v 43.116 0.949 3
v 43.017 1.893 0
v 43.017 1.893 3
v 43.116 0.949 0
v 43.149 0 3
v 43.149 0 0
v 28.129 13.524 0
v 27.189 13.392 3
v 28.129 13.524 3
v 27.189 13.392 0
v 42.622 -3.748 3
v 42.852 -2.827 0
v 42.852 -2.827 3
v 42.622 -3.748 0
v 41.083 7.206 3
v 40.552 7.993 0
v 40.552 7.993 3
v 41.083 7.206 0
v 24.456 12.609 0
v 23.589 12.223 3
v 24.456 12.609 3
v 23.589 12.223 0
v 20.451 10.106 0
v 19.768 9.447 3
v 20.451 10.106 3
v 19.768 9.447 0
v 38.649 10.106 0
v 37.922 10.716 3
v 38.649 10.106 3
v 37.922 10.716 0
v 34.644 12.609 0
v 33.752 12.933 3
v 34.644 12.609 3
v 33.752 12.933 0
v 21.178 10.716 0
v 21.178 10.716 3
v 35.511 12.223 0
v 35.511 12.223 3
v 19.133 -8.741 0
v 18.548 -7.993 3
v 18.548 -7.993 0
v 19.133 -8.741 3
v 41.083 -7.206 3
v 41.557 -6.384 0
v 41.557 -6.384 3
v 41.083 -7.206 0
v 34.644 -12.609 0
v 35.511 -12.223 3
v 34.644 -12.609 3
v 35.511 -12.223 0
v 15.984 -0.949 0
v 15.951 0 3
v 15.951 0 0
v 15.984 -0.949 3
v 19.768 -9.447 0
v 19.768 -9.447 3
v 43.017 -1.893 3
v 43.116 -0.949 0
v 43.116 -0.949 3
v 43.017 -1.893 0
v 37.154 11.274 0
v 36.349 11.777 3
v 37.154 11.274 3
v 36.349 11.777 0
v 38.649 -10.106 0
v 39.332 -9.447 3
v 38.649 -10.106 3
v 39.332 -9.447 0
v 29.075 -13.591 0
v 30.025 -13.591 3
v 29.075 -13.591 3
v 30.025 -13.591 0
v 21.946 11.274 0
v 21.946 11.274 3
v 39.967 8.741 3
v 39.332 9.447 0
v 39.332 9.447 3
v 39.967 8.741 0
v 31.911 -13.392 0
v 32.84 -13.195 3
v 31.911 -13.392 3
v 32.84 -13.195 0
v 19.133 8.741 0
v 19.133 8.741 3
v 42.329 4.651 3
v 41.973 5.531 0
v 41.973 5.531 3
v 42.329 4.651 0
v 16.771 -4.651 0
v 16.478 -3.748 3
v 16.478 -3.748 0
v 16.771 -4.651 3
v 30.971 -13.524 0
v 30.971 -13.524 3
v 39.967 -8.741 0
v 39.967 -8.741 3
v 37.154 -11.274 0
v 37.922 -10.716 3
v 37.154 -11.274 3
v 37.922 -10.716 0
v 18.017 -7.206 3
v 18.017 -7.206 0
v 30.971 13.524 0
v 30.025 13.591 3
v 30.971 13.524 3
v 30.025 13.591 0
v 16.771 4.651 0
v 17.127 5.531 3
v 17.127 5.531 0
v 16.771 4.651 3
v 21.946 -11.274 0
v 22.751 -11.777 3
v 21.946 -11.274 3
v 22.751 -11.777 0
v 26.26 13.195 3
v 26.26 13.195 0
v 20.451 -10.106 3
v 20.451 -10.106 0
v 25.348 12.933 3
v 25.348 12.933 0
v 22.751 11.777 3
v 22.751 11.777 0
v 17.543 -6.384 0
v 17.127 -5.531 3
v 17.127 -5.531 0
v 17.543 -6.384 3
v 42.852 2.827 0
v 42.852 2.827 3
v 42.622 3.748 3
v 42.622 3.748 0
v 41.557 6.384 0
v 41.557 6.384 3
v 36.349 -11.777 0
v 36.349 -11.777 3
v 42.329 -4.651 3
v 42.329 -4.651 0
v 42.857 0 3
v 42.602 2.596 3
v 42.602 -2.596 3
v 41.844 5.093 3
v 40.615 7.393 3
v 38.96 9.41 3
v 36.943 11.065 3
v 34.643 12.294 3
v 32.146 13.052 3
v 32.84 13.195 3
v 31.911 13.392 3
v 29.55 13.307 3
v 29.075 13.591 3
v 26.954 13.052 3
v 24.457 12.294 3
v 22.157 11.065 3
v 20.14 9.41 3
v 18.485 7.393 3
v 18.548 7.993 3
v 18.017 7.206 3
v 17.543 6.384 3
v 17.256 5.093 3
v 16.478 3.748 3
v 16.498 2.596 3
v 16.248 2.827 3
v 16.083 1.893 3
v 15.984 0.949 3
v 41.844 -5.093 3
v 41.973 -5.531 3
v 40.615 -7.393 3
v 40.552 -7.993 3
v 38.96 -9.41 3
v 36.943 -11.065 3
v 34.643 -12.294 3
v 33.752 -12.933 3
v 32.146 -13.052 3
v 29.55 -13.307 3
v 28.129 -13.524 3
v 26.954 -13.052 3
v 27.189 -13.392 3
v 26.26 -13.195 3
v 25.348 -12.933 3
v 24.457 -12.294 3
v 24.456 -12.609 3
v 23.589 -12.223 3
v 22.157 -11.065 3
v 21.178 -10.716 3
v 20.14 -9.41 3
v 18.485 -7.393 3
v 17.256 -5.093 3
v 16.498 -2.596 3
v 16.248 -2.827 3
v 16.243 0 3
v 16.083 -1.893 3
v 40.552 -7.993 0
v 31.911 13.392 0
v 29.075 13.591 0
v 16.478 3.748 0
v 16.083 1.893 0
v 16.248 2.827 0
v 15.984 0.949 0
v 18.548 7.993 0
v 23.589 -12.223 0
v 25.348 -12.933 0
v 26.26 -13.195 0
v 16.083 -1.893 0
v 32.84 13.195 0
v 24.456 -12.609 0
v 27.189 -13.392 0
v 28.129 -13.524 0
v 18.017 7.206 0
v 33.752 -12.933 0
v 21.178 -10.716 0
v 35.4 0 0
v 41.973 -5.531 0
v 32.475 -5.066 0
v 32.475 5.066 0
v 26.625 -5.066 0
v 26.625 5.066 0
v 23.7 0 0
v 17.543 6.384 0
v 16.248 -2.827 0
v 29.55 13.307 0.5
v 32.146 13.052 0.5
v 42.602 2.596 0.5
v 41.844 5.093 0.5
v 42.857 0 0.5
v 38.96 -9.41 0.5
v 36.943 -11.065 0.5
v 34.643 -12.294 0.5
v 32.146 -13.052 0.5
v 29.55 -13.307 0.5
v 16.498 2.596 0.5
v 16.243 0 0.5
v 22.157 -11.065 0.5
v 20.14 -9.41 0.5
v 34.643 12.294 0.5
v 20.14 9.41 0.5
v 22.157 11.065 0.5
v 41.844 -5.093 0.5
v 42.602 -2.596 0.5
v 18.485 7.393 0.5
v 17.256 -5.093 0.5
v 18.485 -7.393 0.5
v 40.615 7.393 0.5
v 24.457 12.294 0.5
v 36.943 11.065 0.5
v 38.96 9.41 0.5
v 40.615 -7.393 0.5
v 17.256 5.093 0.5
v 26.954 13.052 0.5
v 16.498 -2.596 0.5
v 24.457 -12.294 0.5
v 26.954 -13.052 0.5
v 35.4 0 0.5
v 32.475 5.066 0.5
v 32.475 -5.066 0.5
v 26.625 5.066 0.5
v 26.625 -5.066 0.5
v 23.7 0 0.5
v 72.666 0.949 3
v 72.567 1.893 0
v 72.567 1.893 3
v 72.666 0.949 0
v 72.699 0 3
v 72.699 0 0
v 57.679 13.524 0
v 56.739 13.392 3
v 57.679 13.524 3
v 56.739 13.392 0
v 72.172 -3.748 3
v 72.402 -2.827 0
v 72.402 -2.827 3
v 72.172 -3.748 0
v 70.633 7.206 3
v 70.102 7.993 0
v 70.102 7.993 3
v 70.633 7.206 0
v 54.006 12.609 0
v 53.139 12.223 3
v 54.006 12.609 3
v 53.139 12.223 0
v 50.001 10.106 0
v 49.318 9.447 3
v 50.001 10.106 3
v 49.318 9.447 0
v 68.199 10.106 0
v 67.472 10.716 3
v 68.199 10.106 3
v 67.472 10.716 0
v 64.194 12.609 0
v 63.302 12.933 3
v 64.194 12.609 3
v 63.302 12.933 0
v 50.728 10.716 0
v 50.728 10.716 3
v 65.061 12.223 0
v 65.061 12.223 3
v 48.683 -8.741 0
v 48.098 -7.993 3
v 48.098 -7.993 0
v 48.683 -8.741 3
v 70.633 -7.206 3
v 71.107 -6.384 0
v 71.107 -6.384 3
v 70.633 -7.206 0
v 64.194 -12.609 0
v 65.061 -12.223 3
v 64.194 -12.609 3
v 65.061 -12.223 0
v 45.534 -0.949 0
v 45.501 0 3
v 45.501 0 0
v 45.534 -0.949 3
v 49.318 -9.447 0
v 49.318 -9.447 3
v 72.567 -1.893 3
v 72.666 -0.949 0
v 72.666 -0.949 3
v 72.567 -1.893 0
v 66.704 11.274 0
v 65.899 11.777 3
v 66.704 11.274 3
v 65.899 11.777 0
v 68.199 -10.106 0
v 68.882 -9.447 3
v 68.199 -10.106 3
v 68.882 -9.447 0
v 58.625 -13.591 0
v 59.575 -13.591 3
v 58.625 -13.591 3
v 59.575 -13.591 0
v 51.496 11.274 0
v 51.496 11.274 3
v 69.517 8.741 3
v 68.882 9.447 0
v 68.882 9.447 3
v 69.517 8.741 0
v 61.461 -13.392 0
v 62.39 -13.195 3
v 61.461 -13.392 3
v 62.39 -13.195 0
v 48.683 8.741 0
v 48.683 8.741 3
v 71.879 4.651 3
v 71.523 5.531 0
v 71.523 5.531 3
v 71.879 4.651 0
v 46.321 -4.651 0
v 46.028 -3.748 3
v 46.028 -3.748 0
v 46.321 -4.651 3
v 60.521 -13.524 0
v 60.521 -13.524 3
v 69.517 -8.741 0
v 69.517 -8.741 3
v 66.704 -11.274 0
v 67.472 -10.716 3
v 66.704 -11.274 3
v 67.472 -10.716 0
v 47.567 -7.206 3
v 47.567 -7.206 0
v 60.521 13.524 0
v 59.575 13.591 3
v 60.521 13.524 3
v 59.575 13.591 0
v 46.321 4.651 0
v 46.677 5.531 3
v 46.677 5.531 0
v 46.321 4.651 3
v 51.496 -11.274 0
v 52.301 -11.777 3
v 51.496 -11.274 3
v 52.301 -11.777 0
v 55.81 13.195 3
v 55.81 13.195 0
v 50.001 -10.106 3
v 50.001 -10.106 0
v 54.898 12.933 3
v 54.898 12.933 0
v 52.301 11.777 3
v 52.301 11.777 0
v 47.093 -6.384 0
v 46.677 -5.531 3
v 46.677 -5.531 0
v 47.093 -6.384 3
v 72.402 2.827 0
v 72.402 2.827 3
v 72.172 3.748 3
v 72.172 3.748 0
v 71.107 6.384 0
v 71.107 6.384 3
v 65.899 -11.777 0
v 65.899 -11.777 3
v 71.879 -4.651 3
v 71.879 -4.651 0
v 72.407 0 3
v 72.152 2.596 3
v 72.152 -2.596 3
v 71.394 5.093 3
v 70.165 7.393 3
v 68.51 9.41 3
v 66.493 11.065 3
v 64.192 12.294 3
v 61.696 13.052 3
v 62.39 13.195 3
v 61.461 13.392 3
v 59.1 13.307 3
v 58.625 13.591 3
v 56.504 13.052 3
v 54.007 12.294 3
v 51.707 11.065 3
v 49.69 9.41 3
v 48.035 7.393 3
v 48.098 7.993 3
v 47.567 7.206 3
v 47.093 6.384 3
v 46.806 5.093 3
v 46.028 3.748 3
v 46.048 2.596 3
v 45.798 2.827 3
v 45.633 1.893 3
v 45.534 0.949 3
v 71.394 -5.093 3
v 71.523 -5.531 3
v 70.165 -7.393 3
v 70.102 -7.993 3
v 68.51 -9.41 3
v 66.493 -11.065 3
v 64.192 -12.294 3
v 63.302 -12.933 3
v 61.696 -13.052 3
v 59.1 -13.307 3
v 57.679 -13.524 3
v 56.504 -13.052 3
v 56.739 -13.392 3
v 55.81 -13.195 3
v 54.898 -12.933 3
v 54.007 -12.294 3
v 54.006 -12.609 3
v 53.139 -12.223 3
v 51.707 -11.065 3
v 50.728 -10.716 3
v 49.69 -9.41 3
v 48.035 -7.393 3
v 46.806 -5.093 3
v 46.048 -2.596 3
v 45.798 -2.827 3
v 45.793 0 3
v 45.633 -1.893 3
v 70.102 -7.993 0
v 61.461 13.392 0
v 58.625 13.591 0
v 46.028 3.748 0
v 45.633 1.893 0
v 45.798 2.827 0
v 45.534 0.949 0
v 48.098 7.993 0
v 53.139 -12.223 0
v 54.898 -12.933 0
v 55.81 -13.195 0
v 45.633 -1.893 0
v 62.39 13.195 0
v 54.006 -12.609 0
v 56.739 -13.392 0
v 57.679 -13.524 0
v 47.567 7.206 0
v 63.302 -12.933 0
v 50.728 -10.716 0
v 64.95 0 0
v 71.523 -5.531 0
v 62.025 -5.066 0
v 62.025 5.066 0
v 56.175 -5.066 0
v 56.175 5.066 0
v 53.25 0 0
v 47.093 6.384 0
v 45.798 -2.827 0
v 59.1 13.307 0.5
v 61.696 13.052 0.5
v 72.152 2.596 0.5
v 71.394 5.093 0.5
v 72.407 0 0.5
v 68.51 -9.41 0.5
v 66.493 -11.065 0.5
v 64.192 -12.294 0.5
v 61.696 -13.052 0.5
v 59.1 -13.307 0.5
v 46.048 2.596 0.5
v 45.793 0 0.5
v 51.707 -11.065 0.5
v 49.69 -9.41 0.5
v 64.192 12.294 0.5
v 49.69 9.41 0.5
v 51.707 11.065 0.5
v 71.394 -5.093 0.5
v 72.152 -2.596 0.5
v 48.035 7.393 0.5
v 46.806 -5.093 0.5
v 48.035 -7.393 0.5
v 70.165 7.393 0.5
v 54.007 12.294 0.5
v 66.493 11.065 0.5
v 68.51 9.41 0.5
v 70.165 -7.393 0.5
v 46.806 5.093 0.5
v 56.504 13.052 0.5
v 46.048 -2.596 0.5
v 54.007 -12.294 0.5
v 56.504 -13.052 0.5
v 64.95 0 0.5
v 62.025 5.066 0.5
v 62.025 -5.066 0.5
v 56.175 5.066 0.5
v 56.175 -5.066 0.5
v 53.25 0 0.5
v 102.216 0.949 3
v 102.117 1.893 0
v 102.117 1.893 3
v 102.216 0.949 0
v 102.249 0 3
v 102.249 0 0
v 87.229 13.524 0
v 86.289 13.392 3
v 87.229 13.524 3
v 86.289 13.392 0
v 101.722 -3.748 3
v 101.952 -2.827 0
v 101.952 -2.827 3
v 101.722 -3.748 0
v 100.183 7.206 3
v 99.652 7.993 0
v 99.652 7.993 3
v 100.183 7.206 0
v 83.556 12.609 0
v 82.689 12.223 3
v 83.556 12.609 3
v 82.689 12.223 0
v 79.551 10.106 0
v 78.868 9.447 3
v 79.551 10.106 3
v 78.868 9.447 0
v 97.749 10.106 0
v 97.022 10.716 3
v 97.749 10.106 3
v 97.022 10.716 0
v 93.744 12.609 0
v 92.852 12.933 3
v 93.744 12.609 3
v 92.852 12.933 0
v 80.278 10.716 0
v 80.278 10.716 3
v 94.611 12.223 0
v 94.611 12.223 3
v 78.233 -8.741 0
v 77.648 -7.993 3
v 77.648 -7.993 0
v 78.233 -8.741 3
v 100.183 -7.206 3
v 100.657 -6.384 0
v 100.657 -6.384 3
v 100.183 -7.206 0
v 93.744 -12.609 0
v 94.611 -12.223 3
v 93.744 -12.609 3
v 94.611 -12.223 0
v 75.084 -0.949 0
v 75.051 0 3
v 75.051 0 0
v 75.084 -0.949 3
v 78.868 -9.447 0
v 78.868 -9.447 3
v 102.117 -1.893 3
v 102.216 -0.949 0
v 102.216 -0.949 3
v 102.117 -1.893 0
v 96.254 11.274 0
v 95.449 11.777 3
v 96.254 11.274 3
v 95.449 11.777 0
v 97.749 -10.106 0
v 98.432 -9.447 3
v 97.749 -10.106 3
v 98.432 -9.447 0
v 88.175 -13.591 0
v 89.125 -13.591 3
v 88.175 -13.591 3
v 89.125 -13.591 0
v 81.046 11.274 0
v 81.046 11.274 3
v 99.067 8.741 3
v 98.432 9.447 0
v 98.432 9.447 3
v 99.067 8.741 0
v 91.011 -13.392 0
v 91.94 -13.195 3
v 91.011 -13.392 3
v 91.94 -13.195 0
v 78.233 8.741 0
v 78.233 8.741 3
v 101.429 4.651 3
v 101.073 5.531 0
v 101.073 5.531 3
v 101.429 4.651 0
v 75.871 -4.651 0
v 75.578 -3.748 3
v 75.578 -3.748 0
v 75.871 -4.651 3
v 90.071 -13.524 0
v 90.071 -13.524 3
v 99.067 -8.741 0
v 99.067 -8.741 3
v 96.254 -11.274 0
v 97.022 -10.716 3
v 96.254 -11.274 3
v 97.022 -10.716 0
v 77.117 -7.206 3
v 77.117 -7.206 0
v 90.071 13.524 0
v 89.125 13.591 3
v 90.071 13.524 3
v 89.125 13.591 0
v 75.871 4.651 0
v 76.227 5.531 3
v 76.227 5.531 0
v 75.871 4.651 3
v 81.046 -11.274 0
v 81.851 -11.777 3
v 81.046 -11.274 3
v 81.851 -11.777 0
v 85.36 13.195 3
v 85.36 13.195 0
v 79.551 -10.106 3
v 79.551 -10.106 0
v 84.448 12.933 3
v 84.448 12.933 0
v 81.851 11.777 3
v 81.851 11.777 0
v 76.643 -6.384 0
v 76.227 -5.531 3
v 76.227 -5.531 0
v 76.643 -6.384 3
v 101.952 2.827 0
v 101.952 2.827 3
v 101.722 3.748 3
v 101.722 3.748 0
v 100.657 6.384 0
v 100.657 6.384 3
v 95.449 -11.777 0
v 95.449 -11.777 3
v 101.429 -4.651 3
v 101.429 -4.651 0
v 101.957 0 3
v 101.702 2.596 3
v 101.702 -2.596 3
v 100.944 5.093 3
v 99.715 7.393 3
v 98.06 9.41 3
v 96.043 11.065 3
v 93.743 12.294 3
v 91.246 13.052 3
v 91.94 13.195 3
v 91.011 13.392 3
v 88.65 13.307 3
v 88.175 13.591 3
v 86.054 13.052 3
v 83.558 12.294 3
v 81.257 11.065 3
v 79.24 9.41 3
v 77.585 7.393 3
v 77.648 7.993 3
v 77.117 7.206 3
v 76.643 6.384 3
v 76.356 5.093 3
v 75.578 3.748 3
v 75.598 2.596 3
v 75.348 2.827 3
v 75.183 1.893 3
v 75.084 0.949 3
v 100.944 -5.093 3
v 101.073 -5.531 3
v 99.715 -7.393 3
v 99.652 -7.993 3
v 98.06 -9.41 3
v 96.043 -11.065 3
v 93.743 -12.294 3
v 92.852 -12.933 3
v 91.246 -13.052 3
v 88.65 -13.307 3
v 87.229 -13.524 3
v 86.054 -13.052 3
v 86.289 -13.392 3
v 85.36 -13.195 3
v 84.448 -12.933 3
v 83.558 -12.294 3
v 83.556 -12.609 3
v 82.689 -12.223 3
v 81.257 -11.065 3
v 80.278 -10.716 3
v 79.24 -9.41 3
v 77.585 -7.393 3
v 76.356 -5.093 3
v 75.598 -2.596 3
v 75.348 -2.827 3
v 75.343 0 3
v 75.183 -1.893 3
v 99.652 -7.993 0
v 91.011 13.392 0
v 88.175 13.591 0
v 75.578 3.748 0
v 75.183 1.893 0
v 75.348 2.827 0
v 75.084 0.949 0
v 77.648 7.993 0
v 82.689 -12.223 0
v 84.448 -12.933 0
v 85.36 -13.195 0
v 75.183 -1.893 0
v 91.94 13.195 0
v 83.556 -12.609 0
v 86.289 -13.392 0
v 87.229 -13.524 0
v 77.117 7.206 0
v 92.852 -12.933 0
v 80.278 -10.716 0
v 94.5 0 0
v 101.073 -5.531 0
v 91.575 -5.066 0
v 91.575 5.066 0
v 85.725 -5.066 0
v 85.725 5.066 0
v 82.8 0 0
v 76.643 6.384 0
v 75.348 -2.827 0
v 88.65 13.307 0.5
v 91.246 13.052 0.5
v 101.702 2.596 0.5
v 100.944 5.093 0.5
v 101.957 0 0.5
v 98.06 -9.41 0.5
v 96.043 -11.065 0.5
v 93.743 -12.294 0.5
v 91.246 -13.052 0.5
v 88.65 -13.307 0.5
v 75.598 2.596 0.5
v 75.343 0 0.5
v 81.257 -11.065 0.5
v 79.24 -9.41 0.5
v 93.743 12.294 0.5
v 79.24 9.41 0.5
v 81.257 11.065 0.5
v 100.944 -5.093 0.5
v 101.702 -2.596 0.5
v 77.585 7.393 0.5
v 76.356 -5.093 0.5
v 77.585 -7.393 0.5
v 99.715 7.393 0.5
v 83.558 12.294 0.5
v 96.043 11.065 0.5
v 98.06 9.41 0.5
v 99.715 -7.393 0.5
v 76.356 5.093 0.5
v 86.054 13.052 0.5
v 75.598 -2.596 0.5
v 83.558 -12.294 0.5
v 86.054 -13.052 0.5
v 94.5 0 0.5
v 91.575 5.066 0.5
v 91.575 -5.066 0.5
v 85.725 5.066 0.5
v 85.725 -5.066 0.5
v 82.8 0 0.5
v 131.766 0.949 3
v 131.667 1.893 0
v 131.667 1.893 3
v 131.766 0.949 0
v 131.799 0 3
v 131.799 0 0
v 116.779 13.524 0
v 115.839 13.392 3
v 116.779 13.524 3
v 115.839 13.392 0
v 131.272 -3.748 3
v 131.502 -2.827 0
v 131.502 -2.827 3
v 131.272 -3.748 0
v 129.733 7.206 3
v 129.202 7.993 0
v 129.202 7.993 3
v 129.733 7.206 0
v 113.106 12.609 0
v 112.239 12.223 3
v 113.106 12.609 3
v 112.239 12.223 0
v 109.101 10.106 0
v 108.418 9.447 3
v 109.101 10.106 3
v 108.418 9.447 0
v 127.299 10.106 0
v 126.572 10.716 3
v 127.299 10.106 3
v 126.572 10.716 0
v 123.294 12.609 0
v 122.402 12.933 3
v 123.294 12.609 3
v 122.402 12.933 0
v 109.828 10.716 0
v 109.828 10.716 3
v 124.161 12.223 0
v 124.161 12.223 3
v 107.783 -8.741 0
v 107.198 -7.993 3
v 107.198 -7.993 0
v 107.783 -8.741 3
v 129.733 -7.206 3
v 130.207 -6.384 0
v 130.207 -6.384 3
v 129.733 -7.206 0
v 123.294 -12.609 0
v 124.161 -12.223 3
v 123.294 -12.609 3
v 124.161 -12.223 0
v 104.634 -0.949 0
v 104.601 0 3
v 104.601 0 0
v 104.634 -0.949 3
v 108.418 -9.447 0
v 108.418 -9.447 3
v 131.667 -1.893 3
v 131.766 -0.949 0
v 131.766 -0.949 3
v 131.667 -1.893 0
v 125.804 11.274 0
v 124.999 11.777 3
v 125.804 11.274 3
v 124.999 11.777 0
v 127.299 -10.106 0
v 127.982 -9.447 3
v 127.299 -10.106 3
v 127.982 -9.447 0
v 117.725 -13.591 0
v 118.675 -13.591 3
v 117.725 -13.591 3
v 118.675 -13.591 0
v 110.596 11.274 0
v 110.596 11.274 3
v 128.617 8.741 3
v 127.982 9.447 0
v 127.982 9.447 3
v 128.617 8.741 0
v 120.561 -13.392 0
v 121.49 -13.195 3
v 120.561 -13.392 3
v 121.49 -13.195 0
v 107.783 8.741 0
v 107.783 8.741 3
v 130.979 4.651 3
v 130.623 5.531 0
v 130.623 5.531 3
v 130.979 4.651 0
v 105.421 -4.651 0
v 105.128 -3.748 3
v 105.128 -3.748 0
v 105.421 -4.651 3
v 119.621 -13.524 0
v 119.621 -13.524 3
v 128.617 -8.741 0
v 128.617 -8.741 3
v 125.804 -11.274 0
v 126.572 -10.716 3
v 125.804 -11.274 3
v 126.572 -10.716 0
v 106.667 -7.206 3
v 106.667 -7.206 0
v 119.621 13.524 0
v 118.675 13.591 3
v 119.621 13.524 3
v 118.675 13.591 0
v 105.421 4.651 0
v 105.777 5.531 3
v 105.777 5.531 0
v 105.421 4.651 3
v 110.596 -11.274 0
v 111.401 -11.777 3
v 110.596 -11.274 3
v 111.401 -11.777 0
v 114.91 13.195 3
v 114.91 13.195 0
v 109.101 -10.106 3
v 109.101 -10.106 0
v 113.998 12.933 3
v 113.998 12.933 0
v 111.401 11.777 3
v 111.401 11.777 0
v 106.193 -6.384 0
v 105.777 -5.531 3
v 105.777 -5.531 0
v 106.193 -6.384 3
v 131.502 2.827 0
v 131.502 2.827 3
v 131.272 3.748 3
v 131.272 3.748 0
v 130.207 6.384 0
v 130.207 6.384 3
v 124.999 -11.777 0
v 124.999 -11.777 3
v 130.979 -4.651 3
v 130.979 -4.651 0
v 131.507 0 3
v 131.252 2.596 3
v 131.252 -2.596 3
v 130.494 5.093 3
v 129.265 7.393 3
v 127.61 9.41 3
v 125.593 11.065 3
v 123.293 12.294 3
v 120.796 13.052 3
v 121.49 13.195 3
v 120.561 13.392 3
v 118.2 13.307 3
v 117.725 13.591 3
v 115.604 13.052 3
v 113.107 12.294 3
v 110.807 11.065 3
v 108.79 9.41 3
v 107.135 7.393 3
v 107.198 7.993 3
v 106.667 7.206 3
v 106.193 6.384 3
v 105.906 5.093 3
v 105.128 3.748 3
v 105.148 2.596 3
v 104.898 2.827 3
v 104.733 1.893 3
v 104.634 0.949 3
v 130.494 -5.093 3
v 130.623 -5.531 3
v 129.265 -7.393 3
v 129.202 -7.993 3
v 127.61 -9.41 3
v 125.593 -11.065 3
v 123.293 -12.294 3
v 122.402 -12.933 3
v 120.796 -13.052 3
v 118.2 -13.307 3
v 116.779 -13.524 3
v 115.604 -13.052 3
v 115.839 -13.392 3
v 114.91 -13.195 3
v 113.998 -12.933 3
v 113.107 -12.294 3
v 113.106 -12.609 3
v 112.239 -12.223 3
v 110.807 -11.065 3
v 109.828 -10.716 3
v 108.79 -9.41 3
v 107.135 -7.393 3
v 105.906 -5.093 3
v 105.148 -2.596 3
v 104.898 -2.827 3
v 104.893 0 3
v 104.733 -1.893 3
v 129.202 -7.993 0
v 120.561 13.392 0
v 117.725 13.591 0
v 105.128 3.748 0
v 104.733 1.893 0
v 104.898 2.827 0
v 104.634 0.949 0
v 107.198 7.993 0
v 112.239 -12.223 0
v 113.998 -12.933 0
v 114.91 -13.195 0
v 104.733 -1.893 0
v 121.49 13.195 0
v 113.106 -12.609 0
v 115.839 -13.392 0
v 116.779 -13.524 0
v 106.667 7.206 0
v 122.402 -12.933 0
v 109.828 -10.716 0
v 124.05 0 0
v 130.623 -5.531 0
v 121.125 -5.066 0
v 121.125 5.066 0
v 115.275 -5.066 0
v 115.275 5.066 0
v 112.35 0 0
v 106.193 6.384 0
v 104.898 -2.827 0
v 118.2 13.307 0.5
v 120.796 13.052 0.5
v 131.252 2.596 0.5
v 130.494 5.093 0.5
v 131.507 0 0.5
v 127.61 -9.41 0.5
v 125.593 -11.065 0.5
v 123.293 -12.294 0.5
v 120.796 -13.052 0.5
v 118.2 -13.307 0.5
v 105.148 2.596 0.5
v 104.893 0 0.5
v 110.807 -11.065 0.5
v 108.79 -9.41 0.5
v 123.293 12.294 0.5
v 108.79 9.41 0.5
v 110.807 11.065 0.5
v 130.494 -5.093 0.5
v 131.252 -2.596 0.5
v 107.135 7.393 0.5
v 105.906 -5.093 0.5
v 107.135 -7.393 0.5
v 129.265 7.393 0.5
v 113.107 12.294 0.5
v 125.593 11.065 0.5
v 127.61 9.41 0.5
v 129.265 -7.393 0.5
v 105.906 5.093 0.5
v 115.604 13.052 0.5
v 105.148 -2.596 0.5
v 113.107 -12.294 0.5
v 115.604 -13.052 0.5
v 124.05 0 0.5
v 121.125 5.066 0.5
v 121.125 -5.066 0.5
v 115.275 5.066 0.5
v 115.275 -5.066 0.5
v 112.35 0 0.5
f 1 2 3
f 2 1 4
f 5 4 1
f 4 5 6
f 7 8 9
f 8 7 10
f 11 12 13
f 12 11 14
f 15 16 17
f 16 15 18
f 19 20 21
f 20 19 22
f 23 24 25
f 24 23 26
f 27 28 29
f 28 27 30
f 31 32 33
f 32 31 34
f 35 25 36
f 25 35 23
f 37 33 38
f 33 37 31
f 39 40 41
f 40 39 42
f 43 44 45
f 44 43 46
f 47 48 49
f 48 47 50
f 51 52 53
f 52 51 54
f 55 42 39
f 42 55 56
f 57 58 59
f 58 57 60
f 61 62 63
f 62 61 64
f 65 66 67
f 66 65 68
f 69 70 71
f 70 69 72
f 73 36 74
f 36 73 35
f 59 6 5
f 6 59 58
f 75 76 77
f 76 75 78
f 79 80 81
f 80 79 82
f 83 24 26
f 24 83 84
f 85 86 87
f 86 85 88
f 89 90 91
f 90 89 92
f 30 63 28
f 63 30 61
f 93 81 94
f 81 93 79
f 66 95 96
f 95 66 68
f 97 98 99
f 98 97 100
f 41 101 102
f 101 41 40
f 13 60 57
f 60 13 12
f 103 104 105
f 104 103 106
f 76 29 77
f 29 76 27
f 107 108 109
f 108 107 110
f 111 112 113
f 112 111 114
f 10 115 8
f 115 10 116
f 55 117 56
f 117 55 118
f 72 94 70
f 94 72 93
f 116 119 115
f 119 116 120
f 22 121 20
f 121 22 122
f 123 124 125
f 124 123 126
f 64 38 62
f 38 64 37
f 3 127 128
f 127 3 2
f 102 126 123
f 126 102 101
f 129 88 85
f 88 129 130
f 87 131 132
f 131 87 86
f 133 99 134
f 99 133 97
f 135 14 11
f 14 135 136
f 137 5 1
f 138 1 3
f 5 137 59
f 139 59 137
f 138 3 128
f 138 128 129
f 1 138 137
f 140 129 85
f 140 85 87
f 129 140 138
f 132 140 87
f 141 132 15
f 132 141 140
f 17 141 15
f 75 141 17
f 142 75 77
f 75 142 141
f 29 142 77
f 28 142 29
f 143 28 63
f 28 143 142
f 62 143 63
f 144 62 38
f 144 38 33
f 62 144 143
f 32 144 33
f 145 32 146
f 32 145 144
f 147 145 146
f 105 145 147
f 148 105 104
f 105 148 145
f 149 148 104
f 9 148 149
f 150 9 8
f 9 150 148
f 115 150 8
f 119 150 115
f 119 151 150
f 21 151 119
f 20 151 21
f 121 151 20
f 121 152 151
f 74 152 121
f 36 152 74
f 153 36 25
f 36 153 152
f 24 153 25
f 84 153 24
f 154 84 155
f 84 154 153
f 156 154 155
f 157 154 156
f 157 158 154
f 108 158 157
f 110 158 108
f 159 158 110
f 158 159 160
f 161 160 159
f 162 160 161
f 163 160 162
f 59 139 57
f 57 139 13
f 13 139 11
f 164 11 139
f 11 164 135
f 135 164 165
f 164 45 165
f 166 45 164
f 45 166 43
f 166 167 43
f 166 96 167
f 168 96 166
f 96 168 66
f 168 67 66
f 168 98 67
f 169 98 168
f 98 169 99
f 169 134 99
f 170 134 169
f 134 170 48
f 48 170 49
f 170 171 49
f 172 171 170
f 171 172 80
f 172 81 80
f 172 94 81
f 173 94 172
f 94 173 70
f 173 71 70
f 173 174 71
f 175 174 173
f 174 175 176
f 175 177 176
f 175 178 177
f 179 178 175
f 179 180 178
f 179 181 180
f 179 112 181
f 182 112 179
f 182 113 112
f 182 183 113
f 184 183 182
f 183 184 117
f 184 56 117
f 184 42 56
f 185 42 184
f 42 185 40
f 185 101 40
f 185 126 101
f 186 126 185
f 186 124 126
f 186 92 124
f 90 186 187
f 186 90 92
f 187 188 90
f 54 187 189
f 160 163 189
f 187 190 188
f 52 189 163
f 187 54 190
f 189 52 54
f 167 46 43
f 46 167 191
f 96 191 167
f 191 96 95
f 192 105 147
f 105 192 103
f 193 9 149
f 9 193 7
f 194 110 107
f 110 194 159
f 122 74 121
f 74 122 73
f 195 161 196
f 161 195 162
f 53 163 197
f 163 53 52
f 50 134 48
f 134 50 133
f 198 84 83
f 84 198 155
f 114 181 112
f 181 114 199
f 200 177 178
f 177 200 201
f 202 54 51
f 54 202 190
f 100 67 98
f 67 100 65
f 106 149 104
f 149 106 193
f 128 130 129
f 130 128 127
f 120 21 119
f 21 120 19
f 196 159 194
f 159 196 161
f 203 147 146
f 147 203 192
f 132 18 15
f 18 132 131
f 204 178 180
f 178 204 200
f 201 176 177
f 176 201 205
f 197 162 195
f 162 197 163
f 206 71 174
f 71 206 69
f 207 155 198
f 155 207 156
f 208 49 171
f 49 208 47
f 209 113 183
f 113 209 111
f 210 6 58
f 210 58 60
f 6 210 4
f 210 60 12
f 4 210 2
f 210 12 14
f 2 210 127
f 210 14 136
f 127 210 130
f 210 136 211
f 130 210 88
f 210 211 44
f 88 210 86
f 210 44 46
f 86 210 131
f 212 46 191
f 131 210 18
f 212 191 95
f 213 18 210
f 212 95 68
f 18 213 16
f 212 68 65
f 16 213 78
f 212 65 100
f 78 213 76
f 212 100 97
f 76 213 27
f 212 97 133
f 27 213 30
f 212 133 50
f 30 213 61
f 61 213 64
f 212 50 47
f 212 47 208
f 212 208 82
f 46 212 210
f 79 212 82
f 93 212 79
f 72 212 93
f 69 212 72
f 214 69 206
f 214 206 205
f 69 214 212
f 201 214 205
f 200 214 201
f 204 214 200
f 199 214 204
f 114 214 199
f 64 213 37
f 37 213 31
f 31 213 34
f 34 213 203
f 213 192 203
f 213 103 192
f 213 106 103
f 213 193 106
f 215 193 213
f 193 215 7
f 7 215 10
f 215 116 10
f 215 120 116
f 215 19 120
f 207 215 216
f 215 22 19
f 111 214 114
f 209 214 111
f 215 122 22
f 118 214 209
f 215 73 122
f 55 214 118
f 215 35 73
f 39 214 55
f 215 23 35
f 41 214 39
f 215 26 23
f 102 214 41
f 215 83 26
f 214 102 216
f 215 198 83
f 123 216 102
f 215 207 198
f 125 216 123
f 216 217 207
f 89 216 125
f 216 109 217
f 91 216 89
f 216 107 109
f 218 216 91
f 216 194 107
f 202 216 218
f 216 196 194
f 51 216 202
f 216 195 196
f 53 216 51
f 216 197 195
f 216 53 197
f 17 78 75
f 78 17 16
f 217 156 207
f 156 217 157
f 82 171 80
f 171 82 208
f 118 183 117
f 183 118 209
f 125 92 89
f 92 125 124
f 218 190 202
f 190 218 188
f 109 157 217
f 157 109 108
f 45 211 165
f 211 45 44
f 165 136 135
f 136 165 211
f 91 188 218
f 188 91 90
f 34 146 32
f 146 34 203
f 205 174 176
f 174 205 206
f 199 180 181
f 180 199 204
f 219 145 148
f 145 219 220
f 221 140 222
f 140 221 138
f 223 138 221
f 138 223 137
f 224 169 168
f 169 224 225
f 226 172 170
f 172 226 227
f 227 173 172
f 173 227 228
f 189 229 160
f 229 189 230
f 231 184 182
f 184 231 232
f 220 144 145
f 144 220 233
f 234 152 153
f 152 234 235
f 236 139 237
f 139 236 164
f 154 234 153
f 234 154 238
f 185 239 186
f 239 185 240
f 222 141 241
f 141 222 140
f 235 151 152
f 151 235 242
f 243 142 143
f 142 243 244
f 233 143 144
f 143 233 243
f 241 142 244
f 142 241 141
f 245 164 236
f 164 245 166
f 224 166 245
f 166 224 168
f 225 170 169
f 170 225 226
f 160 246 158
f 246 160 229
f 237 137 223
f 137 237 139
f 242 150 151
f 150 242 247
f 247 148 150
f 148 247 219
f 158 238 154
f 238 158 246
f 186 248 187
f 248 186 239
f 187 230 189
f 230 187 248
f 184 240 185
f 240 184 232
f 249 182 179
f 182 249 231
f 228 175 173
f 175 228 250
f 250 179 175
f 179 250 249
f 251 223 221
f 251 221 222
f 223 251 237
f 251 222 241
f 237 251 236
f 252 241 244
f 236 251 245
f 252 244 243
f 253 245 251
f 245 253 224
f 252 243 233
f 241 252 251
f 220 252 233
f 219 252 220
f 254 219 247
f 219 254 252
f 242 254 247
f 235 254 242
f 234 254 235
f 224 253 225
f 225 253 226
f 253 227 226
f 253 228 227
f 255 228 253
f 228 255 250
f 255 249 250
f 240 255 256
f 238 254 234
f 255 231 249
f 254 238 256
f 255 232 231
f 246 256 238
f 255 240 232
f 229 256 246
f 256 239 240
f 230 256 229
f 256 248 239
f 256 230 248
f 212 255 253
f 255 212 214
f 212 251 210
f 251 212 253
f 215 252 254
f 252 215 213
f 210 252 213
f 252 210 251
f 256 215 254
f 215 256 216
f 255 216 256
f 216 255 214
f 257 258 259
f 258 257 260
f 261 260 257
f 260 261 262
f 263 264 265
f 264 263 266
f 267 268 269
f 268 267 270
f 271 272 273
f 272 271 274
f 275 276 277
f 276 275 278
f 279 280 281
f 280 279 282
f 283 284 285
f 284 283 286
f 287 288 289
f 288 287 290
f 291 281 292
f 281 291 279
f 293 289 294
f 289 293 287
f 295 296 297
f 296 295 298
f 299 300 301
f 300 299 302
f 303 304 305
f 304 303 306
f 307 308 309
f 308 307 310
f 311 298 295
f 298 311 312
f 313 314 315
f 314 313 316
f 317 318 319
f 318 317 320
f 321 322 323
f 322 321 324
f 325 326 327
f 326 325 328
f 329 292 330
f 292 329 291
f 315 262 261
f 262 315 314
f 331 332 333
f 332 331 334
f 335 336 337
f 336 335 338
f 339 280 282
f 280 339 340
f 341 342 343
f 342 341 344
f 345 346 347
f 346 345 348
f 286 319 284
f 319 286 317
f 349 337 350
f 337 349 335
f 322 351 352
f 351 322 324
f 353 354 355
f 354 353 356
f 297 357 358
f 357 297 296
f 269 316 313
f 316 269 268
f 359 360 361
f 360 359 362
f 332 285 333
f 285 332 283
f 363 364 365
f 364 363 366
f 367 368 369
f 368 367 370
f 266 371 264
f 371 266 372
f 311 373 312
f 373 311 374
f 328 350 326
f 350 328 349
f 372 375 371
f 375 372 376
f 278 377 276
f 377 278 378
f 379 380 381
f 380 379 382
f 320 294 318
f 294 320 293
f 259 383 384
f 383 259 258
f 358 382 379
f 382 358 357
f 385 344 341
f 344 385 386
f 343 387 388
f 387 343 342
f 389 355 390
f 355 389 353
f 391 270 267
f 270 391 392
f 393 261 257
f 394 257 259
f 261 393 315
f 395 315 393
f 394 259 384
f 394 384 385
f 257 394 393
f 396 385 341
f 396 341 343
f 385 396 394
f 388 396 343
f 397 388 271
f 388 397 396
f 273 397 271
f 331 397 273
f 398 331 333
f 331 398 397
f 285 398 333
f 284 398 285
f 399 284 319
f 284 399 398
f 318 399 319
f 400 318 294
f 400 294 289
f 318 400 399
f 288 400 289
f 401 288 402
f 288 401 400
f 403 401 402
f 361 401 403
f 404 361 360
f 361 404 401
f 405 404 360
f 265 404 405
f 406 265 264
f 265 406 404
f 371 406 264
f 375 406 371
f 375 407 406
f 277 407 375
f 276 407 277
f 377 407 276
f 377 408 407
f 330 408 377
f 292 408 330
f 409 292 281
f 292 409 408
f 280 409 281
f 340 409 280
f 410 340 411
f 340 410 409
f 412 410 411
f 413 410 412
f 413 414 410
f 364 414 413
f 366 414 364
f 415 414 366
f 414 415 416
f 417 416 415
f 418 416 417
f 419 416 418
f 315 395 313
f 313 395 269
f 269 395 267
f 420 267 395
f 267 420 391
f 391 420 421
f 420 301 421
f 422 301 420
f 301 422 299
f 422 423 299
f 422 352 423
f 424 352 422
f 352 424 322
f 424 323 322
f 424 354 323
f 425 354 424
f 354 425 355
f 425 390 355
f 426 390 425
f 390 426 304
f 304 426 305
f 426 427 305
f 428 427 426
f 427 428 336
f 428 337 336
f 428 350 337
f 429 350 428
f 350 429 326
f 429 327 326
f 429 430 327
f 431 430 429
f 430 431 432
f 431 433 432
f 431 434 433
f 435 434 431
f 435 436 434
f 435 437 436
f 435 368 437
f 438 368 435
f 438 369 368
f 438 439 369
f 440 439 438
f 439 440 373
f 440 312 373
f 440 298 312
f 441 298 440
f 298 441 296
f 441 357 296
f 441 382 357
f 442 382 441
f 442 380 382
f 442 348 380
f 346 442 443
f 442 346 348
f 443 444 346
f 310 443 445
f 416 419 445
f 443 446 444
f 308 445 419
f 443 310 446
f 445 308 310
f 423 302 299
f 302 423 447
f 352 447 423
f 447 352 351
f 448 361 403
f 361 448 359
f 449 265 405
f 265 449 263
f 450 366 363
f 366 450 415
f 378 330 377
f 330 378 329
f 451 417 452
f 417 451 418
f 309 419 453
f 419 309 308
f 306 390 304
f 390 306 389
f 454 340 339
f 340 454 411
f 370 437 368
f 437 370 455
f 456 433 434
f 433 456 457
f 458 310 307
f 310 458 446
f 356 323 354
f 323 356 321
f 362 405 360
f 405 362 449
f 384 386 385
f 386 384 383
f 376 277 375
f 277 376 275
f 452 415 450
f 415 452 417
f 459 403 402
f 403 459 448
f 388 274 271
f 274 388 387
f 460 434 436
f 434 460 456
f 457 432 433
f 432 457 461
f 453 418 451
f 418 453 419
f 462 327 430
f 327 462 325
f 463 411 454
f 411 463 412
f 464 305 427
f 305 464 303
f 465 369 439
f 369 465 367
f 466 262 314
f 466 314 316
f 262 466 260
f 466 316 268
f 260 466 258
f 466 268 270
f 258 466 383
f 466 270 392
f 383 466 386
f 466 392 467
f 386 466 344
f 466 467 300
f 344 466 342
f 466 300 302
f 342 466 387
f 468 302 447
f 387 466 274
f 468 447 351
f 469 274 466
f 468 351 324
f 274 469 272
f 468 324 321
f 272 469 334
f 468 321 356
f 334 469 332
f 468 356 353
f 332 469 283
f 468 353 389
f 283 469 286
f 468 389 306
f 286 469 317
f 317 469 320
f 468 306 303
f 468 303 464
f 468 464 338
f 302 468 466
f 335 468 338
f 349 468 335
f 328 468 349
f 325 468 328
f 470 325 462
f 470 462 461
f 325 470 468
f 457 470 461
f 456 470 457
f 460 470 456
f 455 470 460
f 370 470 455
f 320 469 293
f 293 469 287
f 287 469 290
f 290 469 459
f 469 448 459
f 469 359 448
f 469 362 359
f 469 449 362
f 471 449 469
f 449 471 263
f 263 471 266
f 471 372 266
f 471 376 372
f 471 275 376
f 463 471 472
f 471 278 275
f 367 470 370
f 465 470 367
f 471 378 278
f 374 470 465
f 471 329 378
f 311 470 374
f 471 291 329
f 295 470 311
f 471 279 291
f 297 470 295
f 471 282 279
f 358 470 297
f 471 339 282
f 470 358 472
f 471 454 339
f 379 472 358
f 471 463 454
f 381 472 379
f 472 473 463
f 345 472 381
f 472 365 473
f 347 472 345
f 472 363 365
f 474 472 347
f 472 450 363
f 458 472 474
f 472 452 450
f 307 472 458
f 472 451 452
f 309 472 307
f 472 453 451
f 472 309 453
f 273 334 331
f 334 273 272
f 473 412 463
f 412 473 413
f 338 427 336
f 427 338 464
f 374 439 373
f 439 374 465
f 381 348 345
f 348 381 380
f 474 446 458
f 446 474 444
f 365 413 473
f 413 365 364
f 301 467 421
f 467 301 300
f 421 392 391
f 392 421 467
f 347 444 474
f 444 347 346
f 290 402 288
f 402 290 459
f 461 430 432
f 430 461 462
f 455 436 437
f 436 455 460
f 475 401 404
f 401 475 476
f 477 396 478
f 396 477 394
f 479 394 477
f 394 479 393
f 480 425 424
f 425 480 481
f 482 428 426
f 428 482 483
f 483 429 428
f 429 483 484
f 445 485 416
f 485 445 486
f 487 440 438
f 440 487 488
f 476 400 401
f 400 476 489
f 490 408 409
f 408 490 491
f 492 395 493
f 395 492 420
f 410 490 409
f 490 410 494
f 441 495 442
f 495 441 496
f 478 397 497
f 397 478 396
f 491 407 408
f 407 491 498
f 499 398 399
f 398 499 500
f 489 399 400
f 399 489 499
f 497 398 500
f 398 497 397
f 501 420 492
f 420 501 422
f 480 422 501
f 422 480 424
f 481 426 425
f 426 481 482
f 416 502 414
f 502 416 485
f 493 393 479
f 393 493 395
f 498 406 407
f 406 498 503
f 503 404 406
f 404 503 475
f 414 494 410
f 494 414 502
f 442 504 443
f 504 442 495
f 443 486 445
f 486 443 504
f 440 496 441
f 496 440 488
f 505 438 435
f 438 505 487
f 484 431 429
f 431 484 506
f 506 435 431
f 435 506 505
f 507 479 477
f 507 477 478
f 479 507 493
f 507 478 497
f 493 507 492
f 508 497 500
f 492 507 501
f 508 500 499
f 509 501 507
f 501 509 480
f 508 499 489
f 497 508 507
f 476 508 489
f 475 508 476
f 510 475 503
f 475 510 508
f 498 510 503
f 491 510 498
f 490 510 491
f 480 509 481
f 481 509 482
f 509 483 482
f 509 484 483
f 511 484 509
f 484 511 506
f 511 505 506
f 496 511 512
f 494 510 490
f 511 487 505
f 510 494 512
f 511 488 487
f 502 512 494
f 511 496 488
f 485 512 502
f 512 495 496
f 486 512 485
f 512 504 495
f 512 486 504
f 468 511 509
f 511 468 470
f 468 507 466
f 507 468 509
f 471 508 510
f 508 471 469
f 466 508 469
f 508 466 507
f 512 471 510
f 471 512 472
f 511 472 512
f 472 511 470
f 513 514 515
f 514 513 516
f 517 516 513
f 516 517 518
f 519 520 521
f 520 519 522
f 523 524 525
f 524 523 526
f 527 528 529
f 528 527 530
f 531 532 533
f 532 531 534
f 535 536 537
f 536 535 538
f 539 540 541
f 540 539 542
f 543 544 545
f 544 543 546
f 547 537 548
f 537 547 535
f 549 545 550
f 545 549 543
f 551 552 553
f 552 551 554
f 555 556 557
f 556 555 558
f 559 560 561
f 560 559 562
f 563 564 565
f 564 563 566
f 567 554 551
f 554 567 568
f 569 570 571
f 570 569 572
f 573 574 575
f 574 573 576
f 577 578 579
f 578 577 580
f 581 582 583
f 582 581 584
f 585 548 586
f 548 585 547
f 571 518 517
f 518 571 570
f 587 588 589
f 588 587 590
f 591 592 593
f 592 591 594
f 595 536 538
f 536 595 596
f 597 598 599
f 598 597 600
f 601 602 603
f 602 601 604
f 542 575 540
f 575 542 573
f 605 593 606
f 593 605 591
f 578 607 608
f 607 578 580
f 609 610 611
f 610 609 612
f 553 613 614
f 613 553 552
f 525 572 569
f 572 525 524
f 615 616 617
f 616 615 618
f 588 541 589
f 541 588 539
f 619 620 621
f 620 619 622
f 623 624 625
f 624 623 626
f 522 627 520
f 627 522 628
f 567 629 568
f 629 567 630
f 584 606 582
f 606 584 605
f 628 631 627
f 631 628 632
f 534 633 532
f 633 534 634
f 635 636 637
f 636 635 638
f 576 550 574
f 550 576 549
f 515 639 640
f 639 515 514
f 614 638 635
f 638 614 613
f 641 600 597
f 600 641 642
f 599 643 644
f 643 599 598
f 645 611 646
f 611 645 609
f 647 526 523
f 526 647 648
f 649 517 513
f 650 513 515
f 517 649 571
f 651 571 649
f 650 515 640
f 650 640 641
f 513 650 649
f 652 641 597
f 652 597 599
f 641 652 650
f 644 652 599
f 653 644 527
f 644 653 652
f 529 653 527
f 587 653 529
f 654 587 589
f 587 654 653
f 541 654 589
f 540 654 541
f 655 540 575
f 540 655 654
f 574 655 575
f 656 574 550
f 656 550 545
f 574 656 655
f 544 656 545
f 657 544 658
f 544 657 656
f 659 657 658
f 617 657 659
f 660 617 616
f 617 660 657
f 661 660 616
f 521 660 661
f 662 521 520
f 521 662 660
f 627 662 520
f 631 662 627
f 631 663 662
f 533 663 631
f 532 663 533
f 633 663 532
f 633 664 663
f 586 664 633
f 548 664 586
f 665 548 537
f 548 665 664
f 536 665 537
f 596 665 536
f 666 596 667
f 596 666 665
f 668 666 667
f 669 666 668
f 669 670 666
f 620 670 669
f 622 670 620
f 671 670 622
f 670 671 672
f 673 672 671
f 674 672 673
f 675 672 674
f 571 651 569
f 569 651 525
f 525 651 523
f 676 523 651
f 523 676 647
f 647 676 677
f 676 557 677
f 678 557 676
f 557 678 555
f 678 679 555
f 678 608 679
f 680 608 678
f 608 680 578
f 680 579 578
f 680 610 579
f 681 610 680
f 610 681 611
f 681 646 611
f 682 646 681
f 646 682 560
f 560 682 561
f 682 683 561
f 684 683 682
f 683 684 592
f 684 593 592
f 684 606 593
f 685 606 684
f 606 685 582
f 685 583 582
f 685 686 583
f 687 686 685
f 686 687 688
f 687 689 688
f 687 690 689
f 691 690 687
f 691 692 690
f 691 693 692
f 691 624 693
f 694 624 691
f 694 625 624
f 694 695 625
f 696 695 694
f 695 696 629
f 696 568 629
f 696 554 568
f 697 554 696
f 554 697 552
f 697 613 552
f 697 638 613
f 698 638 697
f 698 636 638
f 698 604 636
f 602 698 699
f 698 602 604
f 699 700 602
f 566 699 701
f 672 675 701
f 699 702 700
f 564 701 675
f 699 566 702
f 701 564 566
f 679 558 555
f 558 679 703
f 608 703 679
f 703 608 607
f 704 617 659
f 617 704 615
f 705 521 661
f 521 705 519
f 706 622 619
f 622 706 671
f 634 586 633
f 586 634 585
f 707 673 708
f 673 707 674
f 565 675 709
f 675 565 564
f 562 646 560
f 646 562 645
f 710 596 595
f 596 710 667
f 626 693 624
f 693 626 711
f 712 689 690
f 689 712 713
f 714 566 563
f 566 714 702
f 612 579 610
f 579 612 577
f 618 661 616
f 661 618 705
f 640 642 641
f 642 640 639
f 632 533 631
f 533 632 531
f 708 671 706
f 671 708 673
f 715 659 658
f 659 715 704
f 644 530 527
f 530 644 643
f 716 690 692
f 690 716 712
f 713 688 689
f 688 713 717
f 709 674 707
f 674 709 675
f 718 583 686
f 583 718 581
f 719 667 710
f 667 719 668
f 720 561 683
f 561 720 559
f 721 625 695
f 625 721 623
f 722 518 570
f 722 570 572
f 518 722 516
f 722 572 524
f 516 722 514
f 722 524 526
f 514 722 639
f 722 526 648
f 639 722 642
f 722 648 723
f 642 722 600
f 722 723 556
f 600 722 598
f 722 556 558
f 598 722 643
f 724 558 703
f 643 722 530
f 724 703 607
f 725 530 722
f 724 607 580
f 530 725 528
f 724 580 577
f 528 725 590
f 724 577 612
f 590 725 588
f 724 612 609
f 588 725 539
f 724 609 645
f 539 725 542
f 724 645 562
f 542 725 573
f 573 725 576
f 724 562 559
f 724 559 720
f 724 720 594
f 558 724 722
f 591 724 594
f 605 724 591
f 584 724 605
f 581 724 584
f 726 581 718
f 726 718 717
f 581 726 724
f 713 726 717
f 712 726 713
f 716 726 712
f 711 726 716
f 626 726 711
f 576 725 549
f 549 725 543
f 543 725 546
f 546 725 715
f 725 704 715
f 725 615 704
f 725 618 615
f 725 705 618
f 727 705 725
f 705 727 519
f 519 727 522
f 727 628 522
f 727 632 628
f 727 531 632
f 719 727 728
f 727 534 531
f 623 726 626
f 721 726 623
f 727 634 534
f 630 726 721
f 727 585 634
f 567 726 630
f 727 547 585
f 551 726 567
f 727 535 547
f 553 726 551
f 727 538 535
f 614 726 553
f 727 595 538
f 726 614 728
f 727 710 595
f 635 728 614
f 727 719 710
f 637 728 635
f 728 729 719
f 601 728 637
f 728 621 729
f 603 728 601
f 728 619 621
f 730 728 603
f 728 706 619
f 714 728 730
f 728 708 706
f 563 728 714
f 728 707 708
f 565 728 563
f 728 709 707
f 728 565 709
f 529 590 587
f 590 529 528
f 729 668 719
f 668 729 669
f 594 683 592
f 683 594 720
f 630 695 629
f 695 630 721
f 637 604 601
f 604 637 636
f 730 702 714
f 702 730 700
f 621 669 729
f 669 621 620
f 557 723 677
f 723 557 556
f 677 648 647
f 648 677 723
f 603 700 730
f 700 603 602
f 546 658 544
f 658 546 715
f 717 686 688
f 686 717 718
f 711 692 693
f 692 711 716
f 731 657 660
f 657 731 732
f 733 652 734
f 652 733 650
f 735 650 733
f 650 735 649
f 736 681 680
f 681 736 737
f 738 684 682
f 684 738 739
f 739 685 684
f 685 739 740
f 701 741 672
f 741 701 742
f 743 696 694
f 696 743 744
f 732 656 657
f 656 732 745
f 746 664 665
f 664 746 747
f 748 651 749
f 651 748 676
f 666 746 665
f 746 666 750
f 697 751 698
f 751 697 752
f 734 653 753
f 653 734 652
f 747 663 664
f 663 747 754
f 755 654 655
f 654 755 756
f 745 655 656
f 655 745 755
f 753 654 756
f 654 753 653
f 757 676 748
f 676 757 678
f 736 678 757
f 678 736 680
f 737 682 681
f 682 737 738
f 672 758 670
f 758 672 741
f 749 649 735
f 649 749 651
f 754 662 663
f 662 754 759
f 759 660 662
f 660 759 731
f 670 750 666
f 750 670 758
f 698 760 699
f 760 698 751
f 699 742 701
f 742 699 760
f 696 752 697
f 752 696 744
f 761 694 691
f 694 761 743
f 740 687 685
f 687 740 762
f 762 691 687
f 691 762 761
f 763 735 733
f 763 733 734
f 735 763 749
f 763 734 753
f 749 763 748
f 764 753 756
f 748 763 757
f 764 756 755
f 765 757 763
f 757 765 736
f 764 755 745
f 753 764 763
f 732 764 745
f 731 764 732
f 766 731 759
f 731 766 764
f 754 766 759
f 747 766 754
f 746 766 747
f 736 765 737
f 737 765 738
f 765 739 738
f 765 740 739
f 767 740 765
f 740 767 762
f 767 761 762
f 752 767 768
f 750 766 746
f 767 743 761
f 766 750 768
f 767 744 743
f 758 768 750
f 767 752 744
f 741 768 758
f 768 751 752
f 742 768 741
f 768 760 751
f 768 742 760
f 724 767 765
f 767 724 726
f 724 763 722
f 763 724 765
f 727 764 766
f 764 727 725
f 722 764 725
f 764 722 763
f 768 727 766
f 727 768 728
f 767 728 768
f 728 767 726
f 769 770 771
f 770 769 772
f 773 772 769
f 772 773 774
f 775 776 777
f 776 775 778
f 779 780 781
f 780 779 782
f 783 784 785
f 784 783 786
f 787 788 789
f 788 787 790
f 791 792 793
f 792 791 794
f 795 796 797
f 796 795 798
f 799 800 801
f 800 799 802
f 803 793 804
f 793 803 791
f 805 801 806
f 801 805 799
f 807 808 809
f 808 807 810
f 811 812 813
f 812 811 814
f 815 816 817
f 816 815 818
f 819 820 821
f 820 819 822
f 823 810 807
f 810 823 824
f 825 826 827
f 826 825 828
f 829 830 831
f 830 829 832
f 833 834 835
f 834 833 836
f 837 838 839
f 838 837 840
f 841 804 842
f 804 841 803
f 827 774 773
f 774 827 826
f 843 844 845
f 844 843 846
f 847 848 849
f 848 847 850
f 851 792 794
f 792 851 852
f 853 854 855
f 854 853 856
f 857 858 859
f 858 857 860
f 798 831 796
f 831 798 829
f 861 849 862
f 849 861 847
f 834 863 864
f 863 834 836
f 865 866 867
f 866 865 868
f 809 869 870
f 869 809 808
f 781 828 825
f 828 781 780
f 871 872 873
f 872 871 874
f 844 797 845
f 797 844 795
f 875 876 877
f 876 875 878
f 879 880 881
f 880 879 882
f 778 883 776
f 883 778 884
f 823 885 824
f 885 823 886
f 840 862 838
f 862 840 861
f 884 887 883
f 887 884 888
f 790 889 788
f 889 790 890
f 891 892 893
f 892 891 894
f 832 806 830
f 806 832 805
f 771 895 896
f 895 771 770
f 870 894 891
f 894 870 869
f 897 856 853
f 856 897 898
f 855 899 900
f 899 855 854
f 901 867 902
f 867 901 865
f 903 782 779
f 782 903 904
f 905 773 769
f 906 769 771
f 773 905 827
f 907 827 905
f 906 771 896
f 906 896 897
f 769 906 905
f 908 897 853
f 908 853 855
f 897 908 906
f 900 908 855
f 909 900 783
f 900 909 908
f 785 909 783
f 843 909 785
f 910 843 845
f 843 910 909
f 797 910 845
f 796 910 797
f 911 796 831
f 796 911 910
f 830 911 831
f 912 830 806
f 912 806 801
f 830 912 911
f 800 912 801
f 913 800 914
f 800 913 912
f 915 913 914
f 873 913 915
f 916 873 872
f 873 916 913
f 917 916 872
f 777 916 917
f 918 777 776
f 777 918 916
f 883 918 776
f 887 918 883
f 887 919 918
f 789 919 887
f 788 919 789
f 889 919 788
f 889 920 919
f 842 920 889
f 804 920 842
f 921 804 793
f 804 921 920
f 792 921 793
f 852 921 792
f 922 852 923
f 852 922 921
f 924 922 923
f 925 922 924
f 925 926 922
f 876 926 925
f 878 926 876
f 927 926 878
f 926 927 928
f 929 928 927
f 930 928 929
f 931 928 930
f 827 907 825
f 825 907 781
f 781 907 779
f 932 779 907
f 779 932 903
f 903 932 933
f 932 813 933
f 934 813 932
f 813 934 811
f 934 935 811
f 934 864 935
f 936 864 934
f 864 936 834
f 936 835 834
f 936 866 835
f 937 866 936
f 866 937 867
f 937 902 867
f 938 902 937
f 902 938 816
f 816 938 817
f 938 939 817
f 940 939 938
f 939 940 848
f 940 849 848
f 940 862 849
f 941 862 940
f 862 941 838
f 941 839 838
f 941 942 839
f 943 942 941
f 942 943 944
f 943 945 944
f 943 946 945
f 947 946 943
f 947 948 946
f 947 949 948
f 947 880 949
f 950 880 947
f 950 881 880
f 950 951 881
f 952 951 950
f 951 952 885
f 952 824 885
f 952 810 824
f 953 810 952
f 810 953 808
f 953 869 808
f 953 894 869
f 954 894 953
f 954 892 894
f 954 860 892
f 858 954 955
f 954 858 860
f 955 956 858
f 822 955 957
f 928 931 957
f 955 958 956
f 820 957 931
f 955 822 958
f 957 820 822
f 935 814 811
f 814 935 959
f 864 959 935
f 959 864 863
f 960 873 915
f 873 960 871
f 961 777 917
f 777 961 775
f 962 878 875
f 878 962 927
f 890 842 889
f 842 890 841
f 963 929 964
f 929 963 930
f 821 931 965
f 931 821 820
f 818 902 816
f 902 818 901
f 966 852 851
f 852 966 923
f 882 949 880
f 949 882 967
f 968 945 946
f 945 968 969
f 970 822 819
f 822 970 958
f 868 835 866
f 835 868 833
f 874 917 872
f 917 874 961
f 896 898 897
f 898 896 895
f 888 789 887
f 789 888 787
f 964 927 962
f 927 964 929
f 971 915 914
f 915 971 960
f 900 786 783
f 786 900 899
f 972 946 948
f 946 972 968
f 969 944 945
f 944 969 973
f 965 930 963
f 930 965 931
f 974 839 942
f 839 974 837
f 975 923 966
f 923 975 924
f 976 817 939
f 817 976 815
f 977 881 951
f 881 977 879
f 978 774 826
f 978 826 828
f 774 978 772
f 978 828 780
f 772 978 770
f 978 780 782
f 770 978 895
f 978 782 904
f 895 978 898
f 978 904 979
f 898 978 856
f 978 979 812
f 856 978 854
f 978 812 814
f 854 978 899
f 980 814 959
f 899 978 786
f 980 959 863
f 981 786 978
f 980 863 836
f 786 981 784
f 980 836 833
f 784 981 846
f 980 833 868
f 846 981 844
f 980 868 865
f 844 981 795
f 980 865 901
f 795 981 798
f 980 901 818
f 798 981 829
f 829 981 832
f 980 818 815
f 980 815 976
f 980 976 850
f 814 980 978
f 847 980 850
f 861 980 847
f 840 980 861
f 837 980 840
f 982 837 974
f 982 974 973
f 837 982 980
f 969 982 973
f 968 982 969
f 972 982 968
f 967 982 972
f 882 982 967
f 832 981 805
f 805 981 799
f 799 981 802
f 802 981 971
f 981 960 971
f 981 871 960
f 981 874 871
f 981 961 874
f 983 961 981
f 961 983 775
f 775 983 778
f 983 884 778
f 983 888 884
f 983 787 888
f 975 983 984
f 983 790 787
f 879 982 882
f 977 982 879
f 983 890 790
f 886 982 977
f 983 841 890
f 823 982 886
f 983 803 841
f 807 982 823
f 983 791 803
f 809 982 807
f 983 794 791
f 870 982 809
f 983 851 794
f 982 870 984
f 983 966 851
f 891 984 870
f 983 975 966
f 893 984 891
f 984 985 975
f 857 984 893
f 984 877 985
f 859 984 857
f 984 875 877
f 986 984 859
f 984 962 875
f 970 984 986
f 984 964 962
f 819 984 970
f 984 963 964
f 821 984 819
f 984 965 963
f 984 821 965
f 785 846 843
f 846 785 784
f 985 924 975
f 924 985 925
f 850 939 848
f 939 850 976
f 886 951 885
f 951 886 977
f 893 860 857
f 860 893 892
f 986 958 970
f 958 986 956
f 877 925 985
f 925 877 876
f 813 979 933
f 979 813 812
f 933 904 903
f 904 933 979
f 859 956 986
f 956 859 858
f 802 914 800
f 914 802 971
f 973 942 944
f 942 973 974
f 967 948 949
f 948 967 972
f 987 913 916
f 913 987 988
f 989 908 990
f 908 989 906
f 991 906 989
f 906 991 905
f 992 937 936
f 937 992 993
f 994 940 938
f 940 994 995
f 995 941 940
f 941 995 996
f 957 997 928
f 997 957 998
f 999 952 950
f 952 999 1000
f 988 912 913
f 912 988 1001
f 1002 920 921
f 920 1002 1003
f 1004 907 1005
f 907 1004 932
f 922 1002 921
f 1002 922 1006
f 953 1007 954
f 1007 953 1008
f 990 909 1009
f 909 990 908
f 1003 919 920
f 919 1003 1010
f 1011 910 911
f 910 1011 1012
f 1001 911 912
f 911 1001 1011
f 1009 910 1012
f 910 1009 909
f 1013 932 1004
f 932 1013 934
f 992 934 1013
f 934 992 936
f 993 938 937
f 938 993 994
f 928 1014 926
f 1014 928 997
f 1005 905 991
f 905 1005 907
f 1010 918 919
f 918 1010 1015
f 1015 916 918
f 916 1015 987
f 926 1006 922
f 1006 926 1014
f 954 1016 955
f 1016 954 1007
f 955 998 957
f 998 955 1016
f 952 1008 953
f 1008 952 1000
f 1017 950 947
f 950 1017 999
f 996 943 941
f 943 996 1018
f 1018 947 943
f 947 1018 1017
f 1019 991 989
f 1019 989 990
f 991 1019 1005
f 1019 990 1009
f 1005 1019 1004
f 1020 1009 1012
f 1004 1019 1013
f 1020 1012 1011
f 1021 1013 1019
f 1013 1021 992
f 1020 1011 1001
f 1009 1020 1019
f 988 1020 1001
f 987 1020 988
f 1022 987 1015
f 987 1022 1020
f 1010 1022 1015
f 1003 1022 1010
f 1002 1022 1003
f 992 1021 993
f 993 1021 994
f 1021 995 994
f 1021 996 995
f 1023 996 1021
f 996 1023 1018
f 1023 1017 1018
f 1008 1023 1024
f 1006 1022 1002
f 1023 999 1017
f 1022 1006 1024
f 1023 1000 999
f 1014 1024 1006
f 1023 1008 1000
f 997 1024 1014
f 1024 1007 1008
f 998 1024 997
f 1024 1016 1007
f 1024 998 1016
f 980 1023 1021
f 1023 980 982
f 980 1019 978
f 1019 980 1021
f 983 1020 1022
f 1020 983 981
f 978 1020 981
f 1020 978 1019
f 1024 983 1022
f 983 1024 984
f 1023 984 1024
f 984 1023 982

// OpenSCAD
// Program:    20mm_washer_cap.scad
//
// Function: OpenSCAD program to define a plastic washer cap for
//           3D-print.
//
// Author:   Kjell Arne Rekaa (kjell.arne.rekaa@gmail.com)
// 
// Date:     2024-05-18
// ======================================================================

// Speed up rendering - low resolution only for preview: 
$fn = $preview ? 32 : 90; 

hole_diam  = 10;
wash_size  = 19.7;           // Washer size in millimeter

count      = 4;              // Number of caps
distance   = 1.50;           // Distance factor between caps

wash_hight  = 3;             // Hight for the nut/bolt head
friction   = 1.170;          // Friction factor. Higher: less friction
cyl_thick  = 1.18;           // Cylinder thickness: 1.28 > 1.30
size = wash_size * friction; // Will give right friction


// hexagon carving to fit on a nut or bolt head
module washer(size, height=wash_hight){
    cylinder(h=height, d=size/cos(180/6),center=true, $fn=32);
}

// Produce "count" number of equal caps:
for (i = [1:1:count]) {
  translate([i*distance*wash_size,0,0]) { 
  
    difference() {
      union() {
        difference(){
            cylinder(h=wash_hight, d=size*cyl_thick);
            washer(size, wash_hight+5);
        }
        cylinder(h=wash_hight-2.5, d=size*cyl_thick);
    }
        cylinder(h=wash_hight+6, d=hole_diam*friction, $fn=6);
   }
}
}
